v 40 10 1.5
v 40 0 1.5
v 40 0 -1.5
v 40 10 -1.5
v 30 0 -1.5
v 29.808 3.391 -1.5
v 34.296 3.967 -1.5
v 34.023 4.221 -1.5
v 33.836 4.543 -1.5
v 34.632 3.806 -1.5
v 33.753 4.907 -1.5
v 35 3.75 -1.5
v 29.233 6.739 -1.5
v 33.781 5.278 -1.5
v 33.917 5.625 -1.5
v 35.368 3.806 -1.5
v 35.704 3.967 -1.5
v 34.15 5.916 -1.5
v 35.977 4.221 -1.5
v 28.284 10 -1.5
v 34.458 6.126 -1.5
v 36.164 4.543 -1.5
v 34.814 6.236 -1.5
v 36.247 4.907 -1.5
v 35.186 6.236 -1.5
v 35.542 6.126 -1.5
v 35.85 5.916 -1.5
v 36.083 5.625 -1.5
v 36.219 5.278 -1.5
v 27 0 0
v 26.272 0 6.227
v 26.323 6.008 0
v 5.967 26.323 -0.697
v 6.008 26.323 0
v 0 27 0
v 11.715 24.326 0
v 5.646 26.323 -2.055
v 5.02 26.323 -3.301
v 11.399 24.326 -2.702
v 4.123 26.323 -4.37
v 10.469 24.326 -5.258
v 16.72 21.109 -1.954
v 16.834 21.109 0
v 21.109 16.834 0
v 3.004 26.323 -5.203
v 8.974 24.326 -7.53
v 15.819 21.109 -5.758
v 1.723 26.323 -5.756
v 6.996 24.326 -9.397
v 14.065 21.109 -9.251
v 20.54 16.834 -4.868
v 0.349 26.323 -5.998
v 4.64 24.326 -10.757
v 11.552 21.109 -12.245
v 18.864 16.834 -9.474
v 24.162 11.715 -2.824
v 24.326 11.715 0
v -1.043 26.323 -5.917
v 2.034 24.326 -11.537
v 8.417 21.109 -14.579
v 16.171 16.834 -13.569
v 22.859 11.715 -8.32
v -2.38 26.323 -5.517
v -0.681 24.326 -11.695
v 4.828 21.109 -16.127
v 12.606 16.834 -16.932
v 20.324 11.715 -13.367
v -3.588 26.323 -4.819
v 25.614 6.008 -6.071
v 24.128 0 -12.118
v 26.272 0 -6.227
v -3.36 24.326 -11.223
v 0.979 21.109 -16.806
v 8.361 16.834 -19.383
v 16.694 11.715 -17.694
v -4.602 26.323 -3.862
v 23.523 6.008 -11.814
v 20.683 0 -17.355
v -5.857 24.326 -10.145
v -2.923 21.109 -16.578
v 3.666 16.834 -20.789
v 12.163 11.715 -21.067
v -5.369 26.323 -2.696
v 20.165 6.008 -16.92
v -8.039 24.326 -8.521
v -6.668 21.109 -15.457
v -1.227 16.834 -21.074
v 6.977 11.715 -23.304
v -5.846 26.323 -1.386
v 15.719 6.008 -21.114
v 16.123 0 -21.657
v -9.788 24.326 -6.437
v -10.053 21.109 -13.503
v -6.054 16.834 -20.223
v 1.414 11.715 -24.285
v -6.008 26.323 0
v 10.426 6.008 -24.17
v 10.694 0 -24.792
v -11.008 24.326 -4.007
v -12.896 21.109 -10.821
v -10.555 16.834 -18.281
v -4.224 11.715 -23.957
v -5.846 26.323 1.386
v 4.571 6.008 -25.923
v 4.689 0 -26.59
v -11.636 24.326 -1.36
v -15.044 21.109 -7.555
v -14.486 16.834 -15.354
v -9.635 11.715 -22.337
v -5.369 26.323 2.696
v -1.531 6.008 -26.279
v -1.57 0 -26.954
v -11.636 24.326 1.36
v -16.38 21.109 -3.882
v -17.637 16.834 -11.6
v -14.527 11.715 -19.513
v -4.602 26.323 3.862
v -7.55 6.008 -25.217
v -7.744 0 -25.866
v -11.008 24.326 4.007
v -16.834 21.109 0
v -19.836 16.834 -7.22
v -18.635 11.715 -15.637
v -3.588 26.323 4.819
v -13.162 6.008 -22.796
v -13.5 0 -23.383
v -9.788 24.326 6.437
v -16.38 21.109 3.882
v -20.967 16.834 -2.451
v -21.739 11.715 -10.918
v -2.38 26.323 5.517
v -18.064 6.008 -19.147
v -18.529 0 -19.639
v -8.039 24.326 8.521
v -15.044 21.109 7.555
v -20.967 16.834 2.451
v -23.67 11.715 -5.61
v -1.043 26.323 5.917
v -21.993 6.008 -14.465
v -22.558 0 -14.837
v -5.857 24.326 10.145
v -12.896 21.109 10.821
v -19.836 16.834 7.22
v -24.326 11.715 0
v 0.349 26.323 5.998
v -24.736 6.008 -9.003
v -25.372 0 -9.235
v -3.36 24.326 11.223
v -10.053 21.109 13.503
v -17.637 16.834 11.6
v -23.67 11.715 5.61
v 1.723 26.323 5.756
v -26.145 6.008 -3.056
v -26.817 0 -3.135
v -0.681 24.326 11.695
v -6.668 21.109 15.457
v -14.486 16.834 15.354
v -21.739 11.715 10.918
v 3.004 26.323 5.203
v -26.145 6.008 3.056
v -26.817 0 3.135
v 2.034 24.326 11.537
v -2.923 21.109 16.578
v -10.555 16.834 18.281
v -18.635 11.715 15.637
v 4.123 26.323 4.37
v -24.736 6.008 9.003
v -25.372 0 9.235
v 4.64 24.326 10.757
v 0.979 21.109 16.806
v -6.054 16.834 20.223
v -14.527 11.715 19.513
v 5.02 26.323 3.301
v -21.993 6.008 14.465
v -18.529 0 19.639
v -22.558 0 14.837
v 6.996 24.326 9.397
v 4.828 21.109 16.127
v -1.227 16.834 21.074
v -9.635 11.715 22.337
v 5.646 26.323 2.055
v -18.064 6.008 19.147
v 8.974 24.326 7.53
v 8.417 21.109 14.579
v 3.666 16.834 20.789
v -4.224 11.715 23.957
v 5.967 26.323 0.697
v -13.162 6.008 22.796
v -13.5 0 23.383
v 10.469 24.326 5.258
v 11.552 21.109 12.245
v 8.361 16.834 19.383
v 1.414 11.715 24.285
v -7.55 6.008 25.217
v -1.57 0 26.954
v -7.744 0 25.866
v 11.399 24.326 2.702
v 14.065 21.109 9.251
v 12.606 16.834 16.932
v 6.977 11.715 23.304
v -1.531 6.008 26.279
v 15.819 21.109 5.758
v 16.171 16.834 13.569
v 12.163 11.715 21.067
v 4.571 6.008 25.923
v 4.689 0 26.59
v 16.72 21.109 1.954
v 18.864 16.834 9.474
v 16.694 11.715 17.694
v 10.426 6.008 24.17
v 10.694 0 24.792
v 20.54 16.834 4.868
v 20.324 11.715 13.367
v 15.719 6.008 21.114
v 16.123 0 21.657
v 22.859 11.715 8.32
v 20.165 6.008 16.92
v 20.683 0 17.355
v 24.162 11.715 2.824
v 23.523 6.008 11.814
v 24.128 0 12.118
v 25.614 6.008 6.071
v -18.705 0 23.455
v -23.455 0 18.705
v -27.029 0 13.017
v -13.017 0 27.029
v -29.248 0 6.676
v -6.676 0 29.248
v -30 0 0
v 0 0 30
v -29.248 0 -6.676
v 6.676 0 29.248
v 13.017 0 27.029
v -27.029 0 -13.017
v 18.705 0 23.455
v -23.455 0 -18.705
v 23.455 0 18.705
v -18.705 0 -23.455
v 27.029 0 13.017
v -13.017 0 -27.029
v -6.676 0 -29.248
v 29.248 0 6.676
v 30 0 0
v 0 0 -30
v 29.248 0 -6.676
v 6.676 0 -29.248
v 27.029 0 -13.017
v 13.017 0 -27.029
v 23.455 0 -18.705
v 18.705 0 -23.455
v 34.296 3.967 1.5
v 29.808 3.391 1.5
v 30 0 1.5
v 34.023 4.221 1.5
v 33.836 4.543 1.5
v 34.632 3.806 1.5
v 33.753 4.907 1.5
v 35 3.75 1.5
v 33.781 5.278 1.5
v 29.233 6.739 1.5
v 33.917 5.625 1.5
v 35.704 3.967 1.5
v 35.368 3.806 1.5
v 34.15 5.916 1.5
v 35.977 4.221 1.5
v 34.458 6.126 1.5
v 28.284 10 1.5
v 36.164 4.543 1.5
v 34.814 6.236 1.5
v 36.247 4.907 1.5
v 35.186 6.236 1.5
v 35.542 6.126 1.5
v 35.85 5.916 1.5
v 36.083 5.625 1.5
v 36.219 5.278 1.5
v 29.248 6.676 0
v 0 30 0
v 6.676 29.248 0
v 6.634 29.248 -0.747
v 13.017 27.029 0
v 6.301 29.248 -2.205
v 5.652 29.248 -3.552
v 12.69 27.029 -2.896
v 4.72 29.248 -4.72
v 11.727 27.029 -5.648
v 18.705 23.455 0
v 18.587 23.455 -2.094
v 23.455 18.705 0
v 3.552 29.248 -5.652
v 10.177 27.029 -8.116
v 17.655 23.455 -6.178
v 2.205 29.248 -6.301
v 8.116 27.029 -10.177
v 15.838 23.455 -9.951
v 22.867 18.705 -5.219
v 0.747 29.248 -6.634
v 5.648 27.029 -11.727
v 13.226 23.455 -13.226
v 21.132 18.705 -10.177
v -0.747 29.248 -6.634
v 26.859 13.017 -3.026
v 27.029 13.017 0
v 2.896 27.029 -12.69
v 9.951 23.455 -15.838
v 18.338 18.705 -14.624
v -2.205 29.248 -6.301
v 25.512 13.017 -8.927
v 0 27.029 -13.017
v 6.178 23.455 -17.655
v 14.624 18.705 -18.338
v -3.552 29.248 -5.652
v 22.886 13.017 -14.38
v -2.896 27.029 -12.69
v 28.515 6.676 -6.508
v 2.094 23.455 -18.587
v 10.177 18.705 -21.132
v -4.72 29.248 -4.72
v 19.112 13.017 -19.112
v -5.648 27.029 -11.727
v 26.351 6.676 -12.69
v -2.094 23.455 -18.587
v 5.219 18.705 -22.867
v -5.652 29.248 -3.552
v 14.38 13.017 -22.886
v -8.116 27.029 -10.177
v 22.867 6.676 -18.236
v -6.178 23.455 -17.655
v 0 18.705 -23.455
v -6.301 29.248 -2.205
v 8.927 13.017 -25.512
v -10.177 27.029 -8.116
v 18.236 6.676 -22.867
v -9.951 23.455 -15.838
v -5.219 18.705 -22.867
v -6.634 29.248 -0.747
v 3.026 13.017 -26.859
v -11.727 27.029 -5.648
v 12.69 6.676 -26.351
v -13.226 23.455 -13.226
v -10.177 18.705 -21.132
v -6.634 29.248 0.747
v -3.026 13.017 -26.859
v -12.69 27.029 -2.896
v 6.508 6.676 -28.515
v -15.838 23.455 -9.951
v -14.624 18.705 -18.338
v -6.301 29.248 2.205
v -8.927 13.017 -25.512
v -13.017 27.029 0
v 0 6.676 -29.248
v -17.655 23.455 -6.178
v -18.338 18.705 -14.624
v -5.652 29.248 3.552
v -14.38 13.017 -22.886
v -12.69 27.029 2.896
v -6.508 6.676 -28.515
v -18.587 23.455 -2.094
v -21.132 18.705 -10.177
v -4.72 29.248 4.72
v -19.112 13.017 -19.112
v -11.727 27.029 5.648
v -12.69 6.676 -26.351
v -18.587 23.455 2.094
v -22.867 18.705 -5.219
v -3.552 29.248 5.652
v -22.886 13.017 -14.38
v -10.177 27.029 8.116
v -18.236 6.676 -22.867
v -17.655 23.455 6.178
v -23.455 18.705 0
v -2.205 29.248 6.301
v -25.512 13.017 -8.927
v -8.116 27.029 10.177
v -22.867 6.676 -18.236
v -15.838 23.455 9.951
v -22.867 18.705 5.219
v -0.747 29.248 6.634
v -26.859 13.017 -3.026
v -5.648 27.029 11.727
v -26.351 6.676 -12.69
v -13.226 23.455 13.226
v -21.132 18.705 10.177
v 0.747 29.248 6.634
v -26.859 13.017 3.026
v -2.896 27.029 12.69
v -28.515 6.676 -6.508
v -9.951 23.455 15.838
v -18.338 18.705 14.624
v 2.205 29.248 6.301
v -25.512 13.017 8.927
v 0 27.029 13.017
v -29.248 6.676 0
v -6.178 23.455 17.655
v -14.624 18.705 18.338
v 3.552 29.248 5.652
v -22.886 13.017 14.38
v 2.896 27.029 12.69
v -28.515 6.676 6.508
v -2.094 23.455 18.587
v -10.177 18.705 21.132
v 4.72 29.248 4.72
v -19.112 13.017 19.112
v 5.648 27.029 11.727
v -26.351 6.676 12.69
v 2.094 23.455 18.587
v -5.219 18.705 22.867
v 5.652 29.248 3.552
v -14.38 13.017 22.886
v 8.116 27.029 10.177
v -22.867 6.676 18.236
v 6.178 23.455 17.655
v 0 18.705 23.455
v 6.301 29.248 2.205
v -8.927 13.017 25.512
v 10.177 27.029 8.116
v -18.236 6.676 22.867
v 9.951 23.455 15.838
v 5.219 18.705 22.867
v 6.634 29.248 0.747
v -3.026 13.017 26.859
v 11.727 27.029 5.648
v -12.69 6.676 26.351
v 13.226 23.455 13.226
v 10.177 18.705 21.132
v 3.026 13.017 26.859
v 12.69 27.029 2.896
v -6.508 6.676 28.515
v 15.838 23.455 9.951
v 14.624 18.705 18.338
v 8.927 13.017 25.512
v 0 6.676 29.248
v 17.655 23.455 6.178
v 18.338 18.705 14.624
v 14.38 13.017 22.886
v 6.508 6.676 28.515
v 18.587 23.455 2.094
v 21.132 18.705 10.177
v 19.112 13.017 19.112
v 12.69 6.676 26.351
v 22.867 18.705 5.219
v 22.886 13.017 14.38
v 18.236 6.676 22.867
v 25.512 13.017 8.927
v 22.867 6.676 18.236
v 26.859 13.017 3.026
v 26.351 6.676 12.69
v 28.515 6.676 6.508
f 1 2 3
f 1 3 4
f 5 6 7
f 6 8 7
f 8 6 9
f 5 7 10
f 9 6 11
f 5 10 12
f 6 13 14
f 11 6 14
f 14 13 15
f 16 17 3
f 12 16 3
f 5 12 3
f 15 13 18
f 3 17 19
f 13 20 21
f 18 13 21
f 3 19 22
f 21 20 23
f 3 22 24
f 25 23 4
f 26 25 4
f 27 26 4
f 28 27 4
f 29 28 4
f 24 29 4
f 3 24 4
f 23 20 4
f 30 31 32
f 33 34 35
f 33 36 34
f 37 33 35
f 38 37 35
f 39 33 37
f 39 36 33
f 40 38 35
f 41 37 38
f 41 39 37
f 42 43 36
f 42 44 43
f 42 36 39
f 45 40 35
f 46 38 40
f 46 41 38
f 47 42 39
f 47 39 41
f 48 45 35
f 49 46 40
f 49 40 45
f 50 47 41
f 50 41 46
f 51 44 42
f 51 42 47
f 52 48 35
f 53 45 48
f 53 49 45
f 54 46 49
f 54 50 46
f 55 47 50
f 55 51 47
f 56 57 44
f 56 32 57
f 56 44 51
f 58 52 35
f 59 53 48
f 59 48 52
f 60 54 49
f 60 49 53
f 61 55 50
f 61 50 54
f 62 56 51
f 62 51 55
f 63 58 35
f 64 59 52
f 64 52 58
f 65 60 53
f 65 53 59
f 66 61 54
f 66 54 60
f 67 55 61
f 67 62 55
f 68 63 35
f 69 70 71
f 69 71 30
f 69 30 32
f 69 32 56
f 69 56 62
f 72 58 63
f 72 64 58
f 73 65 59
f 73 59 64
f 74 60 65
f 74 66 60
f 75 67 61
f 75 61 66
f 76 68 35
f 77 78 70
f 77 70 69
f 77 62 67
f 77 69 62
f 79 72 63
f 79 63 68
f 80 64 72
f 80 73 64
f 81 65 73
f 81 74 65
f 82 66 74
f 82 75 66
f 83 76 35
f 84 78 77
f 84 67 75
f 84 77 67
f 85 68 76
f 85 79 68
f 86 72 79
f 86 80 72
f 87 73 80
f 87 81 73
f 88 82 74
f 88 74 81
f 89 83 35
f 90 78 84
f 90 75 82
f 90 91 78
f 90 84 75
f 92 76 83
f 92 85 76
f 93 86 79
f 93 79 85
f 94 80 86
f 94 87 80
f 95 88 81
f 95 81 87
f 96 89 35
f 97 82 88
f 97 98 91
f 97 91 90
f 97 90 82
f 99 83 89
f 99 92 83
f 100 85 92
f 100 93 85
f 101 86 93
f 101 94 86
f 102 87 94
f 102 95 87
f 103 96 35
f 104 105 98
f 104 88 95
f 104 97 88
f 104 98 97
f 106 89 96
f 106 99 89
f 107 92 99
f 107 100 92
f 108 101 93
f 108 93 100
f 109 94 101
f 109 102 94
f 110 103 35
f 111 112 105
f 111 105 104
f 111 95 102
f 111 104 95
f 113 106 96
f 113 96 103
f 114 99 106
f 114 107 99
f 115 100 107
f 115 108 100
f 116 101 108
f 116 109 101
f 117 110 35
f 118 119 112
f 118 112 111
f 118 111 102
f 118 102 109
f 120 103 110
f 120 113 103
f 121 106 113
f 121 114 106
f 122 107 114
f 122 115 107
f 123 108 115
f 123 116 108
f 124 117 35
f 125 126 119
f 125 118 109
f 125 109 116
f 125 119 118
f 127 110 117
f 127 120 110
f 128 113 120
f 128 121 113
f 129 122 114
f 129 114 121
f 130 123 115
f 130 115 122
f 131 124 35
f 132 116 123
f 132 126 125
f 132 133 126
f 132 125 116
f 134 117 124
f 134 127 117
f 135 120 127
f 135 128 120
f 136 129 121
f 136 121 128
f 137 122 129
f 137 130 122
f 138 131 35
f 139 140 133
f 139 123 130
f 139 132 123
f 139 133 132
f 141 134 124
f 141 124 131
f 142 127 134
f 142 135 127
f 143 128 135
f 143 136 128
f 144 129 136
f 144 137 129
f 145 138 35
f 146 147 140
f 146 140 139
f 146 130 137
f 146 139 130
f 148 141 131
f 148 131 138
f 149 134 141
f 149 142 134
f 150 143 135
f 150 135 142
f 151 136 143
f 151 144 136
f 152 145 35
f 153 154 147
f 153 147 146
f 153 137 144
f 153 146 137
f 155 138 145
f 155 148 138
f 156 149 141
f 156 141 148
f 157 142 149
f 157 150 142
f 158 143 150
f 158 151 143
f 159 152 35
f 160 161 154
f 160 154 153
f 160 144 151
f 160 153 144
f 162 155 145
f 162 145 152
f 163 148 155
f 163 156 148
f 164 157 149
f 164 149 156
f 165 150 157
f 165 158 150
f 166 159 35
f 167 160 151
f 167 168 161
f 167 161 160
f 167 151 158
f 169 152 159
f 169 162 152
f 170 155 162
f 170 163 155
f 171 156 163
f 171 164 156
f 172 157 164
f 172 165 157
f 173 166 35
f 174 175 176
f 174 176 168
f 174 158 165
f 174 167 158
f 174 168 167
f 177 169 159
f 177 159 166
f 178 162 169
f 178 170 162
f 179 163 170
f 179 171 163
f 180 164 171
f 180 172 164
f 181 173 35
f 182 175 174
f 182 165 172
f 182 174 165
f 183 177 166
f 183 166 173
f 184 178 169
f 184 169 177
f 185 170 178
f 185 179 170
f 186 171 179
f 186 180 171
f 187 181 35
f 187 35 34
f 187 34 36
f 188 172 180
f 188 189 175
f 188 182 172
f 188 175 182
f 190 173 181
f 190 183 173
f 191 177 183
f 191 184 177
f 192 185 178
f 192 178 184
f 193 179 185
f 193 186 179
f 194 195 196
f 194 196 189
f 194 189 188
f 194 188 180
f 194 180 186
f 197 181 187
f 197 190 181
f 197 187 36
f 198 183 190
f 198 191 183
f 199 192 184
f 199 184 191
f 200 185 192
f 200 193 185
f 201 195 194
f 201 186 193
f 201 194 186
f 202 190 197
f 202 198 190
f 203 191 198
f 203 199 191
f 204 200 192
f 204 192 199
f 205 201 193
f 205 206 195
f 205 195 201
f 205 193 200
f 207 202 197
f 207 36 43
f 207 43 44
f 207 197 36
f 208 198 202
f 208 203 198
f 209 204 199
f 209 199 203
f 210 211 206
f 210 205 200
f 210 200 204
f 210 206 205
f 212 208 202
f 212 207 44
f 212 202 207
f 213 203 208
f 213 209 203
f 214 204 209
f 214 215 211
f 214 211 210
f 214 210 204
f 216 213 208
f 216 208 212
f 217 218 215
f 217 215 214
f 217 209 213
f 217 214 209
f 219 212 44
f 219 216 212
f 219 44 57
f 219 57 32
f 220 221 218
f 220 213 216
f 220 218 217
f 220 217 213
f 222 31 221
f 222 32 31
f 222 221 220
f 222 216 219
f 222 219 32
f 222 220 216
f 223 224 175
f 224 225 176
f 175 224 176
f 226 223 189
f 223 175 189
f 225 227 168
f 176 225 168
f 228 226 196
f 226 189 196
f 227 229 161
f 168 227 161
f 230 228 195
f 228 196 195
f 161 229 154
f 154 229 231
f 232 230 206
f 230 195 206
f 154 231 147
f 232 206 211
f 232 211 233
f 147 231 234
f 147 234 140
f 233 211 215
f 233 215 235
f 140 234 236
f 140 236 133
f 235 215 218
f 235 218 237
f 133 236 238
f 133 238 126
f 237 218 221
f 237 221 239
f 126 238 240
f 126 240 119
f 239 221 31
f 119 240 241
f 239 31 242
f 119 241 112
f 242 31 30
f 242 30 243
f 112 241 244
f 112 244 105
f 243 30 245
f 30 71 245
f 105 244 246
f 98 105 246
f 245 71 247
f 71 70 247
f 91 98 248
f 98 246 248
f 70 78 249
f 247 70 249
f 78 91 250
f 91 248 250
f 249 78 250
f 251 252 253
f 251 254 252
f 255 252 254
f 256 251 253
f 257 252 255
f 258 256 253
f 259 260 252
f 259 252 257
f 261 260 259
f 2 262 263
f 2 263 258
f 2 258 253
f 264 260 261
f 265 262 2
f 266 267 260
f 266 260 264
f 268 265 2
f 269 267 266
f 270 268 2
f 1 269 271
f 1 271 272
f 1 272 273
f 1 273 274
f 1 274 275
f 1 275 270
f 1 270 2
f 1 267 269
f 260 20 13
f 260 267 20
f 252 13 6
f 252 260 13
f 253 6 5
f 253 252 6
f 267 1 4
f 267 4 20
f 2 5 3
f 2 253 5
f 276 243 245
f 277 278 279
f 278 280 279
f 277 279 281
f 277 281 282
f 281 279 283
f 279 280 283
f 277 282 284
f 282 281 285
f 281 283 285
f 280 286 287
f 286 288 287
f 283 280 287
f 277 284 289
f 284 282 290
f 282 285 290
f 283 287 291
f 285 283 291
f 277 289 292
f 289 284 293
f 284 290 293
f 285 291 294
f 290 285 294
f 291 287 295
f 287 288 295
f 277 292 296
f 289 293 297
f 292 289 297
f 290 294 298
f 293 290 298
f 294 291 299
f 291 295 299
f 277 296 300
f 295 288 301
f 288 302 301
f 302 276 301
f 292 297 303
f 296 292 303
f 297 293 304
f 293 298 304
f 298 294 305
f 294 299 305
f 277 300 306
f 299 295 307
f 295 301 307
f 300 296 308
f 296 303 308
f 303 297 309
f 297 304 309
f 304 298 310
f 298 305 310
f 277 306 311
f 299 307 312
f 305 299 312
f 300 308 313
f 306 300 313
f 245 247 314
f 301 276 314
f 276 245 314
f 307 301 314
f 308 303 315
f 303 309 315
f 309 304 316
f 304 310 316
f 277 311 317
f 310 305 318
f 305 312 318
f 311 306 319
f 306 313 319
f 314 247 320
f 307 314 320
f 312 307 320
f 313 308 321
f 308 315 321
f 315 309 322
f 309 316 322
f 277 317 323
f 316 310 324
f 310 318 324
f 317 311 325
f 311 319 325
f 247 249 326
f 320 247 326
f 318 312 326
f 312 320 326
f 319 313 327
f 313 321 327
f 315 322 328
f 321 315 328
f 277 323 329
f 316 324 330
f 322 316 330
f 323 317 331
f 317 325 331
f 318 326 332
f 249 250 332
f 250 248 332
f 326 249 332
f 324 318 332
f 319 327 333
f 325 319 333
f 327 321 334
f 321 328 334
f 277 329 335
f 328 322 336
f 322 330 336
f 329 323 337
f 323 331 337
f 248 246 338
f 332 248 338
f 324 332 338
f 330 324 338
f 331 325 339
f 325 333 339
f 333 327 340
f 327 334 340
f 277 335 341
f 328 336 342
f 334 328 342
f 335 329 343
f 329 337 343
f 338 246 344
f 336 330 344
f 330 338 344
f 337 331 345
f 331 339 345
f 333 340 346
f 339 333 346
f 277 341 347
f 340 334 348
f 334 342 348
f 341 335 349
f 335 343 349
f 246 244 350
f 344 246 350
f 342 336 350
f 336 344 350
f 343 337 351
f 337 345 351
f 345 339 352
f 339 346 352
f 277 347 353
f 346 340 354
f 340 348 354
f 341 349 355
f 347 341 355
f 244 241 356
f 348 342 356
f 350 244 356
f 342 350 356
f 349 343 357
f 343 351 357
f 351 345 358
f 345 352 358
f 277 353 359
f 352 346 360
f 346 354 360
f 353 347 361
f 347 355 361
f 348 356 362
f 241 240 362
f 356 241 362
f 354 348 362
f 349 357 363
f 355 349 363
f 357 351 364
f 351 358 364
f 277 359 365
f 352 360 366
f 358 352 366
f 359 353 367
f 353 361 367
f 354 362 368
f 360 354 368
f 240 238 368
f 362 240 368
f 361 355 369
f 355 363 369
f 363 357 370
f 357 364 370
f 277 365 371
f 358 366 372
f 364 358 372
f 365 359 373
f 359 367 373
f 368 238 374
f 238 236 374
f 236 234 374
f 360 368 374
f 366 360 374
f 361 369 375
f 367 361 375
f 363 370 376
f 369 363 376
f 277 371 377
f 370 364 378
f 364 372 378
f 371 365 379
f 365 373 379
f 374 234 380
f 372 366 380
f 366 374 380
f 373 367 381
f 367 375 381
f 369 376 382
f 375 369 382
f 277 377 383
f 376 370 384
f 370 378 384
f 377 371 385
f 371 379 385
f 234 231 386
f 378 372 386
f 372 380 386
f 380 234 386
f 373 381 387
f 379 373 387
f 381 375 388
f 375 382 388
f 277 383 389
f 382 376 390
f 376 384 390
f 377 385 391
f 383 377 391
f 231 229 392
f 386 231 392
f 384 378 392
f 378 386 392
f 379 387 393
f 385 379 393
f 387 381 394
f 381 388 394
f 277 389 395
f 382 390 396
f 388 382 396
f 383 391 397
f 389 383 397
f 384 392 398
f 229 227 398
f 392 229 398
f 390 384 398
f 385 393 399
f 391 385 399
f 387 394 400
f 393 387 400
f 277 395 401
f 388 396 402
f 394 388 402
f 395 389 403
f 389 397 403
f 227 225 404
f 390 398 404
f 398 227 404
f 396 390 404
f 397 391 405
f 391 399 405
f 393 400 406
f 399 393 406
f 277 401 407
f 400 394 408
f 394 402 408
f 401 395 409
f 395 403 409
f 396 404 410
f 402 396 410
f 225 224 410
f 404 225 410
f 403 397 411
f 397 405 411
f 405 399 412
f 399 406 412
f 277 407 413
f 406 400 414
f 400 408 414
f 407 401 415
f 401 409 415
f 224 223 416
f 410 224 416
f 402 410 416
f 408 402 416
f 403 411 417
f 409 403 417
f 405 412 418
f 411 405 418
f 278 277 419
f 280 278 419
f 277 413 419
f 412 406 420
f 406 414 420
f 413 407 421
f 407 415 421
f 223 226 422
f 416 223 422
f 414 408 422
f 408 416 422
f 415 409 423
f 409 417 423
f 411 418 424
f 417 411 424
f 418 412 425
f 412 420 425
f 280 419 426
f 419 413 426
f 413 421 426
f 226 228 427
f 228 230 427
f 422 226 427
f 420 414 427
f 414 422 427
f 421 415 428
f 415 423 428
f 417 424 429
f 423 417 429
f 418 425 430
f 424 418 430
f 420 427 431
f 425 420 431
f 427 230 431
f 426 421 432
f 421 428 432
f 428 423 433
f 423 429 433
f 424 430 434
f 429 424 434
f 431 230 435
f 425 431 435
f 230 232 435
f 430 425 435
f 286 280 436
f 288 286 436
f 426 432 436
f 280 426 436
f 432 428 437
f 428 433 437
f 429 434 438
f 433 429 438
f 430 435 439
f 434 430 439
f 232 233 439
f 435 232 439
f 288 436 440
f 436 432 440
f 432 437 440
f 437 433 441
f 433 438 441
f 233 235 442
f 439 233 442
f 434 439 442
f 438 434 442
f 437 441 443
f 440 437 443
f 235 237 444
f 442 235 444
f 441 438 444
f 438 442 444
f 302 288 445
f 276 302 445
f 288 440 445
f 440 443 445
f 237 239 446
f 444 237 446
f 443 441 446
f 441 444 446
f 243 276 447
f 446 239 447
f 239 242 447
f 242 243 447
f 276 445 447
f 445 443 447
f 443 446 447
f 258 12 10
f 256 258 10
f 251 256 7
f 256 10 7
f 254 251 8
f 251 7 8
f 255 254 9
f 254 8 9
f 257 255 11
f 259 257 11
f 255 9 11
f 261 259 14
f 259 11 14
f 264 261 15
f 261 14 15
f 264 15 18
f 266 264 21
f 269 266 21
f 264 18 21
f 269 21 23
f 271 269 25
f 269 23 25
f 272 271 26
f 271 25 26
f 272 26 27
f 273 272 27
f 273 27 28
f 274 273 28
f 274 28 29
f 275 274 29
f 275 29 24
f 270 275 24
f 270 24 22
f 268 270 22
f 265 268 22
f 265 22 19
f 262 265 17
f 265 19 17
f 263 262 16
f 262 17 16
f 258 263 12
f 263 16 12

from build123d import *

# Parameters (mm, degrees)
SHELL2_T            = -3
BOSS_EXTRUDE1_DEPTH = 1.5
SKETCH5_W           = 1.25
SKETCH5_H           = 31.5


with BuildPart() as part:
    # Sketch2 → Revolve1 (revolve)
    with BuildSketch(Plane.XY):
        with BuildLine():
            Line((0, 0), (0, 30))
            ThreePointArc((0, 30), (21.213203436, 21.213203436), (30, 0))
            Line((30, 0), (0, 0))
        make_face()
    revolve(axis=Axis((0, 0, 0), (0, 1, 0)))

    # Shell2
    shell2_openings = [part.faces().sort_by_distance(p)[0] for p in [
        (0, 0, 0),
    ]]
    offset(amount=SHELL2_T, openings=shell2_openings, kind=Kind.INTERSECTION)


with BuildPart() as body_2:
    # Sketch4 → Boss-Extrude1 (new, symmetric)
    with BuildSketch(Plane.XY):
        with BuildLine():
            Line((30, 0), (40, 0))
            Line((40, 0), (40, 10))
            Line((40, 10), (28.284271247, 10))
            ThreePointArc((28.284271247, 10), (29.56795679, 5.073059362), (30, 0))
        make_face()
    extrude(amount=BOSS_EXTRUDE1_DEPTH, both=True)

    # Sketch5 → M3 Tapped Hole1 (revolve, cut)
    with BuildSketch(Plane(origin=(35, 5, 1.5), x_dir=(0, -1, 0), z_dir=(1, 0, 0))):
        with Locations((0.625, 15.75)):
            Rectangle(SKETCH5_W, SKETCH5_H)
    revolve(axis=Axis((35, 5, 7.85), (0, 0, -1)), mode=Mode.SUBTRACT)


solid = Compound([part.part, body_2.part])
